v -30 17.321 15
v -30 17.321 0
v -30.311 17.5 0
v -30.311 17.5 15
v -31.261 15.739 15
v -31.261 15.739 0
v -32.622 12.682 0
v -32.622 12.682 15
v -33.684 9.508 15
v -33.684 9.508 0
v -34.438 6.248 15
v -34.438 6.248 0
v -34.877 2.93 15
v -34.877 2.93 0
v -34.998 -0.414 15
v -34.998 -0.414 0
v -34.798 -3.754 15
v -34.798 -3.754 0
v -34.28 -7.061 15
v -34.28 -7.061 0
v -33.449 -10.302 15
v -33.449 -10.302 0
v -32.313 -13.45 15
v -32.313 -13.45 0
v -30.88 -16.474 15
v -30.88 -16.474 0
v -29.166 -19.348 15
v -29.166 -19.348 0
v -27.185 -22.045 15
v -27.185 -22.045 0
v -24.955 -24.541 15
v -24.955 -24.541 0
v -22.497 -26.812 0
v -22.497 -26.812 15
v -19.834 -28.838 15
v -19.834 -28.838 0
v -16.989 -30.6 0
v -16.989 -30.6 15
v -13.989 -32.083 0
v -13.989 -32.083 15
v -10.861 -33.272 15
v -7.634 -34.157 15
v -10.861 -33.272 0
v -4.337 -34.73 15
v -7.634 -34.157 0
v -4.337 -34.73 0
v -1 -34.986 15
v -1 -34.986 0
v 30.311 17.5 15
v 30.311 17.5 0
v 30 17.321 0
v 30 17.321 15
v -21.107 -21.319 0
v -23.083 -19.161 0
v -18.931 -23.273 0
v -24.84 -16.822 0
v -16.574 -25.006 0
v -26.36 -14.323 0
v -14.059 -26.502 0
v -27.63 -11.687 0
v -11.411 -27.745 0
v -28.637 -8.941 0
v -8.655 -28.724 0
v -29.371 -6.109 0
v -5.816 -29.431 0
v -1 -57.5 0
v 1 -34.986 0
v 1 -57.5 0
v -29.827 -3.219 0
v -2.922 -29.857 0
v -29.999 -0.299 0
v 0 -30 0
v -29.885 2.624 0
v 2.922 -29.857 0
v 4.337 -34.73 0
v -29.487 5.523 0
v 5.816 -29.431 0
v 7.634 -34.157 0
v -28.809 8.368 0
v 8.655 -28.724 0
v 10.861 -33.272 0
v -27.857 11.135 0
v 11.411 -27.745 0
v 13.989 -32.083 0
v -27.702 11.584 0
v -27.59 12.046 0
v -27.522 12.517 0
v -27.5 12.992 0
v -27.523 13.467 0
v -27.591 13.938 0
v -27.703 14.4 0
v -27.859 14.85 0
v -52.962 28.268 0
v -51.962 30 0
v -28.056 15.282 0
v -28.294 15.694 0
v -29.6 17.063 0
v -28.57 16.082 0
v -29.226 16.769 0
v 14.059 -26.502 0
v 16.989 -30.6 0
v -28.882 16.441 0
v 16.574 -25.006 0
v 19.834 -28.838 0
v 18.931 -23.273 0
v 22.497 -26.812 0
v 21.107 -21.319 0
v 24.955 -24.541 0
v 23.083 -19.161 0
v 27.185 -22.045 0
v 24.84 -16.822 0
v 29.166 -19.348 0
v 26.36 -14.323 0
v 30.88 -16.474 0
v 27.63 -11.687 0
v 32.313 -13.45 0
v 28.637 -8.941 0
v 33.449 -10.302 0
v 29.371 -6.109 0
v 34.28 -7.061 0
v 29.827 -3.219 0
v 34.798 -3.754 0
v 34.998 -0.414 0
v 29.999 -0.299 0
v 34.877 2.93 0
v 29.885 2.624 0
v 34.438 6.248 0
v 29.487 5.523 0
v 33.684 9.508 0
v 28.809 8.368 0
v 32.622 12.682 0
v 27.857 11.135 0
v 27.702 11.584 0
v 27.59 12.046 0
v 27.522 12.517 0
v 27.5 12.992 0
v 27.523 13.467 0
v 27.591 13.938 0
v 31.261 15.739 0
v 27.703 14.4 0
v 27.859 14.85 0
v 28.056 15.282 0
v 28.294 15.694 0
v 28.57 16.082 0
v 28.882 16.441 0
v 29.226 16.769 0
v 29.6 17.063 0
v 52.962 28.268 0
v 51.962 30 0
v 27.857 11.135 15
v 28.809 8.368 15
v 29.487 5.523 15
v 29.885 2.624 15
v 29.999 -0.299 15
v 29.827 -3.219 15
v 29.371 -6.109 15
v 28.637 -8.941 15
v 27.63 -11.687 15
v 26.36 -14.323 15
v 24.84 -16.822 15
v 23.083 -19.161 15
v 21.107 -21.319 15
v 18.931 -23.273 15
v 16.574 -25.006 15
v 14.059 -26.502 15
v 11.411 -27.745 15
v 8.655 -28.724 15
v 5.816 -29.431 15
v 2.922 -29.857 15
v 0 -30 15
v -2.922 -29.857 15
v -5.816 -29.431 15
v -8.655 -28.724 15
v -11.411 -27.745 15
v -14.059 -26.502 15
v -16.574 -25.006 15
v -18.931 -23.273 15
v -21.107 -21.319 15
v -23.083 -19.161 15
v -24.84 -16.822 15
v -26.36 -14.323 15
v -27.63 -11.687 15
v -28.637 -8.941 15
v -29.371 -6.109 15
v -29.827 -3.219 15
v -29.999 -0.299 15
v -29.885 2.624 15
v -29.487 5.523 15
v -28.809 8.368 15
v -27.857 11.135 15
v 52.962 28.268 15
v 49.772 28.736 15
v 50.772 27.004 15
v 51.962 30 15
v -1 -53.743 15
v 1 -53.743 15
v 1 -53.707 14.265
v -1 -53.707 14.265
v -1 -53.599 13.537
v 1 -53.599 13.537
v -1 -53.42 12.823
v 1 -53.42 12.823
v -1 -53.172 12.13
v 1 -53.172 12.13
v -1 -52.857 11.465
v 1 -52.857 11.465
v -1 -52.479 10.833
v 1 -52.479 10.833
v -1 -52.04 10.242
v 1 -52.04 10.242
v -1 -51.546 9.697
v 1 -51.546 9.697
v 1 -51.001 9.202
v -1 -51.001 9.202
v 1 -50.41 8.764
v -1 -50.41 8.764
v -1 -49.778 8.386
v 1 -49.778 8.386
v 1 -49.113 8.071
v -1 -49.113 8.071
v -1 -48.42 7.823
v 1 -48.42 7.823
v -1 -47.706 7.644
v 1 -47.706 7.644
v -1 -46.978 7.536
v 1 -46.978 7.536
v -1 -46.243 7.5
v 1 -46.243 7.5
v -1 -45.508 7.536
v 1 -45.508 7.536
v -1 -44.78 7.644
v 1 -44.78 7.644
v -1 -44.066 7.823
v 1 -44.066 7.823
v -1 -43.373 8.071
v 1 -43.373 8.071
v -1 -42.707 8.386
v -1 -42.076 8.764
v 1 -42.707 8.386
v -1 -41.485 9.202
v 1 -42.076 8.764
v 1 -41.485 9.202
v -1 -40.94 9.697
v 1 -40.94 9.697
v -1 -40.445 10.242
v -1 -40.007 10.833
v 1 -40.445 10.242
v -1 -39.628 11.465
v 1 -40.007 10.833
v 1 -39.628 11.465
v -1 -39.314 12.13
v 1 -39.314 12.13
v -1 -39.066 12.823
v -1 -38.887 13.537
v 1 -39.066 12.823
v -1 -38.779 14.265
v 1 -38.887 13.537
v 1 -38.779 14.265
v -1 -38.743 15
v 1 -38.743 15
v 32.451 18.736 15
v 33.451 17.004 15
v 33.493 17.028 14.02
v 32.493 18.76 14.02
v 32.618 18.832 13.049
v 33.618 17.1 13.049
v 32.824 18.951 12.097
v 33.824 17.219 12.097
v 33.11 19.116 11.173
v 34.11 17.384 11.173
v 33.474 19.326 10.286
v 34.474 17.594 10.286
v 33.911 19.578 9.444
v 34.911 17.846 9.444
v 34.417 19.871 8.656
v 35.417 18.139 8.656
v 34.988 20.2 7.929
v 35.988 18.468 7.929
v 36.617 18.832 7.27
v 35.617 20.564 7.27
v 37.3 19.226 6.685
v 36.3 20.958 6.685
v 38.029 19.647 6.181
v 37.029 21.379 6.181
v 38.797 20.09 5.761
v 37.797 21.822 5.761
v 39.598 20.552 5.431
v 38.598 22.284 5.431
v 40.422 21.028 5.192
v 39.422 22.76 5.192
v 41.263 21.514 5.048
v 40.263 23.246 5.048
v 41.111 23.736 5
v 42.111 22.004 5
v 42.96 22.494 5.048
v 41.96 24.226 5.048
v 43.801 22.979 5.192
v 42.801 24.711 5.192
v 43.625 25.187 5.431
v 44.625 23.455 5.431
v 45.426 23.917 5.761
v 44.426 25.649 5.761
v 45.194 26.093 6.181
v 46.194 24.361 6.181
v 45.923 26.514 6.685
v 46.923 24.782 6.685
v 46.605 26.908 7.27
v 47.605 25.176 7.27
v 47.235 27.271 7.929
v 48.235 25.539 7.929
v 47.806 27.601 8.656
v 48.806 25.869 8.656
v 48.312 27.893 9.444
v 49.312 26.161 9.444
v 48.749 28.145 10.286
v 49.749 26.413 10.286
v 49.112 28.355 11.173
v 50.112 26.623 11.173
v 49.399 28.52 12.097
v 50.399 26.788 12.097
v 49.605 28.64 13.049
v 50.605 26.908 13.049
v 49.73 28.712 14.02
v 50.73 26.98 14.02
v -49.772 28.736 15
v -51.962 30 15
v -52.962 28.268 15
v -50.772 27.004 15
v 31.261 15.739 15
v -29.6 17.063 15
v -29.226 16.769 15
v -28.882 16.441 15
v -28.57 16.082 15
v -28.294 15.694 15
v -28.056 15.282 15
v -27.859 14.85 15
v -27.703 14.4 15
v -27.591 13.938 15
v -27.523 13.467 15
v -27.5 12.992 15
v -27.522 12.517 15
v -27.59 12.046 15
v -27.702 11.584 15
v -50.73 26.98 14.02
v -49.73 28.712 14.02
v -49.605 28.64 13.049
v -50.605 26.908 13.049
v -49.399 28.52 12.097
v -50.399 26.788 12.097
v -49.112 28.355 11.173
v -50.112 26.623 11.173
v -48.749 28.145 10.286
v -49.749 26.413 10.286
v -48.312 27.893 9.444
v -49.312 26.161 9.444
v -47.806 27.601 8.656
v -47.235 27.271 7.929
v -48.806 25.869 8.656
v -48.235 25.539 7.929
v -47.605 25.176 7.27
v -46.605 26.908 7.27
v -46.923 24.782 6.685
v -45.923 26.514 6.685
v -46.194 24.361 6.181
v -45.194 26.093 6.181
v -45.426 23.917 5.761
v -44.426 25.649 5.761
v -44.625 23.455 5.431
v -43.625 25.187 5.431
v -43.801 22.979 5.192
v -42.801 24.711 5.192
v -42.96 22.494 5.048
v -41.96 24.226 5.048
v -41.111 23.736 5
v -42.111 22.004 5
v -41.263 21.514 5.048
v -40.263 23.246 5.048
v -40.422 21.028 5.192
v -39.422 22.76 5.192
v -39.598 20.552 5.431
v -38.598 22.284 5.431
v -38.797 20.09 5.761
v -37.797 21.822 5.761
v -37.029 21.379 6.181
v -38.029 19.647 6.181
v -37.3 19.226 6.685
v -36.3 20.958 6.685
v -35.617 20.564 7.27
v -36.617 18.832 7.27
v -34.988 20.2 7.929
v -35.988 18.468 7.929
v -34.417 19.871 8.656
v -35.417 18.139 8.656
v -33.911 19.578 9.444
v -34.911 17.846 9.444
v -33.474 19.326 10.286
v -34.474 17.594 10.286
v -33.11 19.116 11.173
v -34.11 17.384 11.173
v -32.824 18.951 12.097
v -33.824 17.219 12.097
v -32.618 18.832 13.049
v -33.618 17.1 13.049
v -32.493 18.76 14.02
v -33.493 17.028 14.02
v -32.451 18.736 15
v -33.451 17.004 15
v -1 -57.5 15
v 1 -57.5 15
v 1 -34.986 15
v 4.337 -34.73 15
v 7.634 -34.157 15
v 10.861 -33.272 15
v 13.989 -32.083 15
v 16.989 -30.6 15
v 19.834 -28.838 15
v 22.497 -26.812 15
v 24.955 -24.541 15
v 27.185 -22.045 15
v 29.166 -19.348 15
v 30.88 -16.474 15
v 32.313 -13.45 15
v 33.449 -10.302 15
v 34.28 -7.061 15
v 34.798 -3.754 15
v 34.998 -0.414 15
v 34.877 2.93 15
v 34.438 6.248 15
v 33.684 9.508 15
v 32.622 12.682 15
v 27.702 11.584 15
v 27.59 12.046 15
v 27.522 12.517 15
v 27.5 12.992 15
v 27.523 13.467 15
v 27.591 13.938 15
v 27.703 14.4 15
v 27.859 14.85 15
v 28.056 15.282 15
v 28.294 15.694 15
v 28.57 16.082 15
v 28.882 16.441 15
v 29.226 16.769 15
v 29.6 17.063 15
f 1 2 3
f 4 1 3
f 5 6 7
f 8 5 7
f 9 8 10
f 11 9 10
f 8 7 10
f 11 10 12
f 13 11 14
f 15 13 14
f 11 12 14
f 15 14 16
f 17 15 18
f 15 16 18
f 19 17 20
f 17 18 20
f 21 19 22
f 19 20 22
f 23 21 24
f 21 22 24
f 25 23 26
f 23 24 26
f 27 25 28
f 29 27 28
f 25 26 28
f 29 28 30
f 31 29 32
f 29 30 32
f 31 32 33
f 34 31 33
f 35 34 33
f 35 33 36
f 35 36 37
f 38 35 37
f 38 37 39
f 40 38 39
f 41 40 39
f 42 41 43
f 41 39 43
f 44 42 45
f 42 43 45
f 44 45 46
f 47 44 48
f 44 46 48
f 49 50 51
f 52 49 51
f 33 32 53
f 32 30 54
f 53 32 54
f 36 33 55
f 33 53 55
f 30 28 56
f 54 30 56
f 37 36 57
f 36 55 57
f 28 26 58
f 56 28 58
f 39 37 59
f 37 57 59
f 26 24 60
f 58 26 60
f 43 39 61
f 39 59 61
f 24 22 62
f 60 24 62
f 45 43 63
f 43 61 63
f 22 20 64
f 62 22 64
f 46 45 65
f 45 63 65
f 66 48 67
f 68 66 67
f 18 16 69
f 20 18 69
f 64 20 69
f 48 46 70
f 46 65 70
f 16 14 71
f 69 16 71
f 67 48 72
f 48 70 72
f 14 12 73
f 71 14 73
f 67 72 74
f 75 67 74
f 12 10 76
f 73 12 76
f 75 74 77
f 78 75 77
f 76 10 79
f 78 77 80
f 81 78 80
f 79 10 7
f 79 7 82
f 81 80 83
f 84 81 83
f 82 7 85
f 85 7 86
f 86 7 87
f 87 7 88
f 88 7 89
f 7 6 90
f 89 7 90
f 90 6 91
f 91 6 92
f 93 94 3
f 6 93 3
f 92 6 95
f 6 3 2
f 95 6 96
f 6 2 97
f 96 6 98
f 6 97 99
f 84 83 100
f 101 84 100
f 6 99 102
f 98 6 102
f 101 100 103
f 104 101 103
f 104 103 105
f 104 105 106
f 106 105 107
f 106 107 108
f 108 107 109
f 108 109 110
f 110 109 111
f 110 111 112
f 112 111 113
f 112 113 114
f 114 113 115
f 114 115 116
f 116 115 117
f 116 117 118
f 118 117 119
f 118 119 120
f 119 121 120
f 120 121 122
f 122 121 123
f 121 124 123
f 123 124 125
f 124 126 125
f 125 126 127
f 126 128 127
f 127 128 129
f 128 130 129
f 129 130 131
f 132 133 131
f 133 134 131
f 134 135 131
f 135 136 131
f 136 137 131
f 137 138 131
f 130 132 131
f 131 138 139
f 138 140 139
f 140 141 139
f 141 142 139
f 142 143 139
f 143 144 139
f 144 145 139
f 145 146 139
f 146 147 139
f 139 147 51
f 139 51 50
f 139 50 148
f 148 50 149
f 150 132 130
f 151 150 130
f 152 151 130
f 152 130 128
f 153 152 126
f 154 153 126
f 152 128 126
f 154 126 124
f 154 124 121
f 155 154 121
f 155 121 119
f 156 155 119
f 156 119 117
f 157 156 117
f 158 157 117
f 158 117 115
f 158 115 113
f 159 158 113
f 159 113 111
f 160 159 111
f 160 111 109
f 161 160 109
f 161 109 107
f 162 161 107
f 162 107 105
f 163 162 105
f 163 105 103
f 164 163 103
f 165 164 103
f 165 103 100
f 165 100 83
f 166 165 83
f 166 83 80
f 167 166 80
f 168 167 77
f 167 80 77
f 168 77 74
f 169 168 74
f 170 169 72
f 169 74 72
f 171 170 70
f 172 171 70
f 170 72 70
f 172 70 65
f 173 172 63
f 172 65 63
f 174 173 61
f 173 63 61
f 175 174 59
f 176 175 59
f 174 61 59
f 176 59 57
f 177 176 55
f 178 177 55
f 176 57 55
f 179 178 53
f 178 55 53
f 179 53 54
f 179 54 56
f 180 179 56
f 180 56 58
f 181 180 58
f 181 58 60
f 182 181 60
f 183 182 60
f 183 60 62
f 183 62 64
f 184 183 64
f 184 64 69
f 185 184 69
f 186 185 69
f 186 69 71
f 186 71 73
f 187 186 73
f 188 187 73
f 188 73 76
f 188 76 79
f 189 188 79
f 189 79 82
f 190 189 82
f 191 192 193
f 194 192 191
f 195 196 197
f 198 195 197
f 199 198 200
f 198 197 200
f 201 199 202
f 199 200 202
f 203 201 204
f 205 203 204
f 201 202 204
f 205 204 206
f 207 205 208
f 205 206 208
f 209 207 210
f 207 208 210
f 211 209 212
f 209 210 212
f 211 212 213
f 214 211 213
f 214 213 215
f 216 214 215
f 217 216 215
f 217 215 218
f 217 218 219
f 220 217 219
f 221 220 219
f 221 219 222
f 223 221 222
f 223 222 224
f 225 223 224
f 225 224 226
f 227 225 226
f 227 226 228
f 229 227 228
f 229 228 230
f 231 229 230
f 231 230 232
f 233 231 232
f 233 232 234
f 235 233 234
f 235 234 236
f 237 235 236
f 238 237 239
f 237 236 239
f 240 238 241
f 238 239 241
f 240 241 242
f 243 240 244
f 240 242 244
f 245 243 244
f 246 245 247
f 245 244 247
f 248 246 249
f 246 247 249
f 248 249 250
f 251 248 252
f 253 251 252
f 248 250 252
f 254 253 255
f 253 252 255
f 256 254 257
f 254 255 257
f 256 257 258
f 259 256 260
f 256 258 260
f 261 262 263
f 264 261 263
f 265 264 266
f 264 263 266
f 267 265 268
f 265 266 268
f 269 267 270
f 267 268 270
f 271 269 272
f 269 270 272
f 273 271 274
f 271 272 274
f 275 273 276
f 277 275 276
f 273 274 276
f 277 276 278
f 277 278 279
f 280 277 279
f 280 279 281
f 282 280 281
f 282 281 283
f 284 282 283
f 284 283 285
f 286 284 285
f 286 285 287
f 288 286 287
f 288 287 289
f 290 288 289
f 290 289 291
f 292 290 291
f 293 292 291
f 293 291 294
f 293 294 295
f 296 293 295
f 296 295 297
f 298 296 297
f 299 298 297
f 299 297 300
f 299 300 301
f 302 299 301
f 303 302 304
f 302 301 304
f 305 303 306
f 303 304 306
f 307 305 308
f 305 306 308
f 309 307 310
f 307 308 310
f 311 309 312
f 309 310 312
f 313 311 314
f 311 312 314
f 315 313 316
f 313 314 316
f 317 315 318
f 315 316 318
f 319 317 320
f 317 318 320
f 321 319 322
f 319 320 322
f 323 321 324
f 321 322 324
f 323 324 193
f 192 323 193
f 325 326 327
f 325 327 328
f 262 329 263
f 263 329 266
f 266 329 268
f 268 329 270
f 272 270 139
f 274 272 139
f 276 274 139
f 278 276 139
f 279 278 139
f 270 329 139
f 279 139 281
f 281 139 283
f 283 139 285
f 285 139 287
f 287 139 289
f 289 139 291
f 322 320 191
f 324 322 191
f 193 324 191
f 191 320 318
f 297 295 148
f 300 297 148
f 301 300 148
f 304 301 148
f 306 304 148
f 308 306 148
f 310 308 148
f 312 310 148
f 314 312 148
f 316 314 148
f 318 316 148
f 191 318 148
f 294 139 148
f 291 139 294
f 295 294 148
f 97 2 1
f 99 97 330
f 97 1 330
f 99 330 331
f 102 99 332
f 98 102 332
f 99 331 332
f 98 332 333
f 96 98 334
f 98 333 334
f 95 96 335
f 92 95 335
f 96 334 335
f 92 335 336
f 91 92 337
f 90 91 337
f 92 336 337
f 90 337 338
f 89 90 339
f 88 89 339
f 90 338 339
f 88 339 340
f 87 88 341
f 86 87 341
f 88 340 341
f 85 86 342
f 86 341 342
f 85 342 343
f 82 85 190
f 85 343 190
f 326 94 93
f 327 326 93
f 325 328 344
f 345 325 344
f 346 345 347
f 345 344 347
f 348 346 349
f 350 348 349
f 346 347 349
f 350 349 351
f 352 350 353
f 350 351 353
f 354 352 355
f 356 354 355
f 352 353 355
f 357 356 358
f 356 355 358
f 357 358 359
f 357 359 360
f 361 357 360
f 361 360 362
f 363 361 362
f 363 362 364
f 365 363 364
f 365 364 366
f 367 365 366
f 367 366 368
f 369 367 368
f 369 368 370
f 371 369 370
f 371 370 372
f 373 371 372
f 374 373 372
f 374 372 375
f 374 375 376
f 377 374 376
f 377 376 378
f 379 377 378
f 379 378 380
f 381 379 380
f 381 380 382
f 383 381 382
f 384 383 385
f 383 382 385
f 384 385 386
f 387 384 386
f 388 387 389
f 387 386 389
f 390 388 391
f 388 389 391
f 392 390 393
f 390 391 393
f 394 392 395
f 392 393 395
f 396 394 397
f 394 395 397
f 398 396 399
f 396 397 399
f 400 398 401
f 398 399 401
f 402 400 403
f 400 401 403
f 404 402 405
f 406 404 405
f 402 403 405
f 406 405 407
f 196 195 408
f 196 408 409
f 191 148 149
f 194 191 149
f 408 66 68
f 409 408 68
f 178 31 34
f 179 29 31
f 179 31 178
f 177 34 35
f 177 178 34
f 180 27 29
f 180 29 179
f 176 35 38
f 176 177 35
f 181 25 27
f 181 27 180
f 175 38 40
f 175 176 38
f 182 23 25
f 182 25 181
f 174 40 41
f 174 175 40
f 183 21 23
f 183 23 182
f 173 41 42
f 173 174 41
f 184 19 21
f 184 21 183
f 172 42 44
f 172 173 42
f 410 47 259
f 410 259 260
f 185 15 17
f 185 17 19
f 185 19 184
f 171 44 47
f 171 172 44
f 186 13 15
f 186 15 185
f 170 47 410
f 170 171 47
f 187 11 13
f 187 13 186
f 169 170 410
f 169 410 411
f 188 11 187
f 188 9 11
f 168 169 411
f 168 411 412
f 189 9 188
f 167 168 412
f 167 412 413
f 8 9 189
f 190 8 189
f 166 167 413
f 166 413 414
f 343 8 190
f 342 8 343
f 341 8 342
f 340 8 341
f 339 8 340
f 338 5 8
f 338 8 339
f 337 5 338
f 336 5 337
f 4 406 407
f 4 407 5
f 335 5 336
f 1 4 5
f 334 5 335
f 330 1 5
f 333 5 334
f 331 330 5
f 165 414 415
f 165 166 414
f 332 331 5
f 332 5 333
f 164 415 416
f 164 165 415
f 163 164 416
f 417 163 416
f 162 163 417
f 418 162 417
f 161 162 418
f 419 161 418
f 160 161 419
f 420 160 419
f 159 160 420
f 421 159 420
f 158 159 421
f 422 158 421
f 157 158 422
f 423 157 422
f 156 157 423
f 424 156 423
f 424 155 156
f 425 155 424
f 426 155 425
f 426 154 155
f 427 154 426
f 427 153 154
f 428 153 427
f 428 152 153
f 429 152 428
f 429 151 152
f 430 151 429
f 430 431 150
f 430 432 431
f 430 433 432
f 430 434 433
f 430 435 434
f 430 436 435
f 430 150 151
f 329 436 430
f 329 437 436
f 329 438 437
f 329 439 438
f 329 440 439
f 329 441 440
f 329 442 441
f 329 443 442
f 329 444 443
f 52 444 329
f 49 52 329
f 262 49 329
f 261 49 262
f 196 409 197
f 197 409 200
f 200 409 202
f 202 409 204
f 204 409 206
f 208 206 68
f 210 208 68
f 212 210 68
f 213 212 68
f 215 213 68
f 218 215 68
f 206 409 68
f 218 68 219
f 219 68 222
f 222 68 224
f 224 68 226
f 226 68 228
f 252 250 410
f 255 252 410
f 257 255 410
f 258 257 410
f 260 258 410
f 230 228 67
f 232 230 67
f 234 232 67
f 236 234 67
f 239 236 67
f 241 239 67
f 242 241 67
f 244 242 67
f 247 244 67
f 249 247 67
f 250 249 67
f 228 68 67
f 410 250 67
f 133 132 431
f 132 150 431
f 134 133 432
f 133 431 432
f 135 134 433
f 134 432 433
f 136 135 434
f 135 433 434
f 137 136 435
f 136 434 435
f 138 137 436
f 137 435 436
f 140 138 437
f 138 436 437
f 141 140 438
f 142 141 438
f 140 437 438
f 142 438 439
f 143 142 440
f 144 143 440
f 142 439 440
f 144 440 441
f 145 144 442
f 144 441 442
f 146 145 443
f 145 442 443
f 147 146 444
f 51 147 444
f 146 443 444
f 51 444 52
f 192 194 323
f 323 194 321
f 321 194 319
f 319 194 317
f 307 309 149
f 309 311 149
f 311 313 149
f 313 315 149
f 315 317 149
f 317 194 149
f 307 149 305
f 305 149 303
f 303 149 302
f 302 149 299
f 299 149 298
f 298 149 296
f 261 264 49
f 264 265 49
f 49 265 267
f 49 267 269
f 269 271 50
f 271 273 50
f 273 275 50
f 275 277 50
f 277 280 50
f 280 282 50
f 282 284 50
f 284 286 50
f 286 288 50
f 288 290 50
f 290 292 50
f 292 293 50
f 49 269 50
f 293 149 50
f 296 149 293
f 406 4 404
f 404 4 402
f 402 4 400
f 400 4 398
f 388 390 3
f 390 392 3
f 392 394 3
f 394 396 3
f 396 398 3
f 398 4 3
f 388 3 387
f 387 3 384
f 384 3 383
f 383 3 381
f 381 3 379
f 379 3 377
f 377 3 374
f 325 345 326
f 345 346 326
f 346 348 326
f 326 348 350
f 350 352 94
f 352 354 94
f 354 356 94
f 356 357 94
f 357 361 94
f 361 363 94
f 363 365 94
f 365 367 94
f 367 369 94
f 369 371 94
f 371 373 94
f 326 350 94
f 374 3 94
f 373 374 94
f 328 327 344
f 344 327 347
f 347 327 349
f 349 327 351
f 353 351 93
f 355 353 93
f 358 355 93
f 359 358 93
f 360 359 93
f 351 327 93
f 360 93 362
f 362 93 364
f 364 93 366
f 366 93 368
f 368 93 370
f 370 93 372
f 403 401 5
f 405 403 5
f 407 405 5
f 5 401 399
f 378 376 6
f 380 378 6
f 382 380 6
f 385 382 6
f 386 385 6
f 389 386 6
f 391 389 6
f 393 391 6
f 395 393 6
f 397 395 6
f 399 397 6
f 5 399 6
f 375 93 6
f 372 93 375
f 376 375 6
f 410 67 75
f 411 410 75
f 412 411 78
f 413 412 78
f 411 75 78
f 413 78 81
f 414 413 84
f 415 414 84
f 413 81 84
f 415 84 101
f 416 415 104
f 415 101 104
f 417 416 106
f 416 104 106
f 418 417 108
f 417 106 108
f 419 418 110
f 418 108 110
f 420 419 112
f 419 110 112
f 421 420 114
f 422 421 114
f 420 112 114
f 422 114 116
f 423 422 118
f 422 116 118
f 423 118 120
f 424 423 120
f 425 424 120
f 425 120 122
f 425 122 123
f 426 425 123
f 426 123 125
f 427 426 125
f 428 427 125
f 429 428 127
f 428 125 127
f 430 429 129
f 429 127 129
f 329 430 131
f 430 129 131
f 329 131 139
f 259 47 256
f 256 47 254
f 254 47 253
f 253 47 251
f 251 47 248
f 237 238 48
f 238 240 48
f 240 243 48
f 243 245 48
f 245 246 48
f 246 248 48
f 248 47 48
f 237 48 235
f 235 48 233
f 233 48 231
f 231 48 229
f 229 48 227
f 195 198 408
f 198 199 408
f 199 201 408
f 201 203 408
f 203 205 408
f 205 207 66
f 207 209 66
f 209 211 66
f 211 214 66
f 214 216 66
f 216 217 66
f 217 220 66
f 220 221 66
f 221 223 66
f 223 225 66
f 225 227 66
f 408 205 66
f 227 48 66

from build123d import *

# Parameters (mm, degrees)
F1_DEPTH = 15
F3_DEPTH = 54.4625242271
F5_DEPTH = 54.4625242271
F7_DEPTH = 53.9625242271
F8_R     = 5


with BuildPart() as f1:
    # F0 (on Top) → F1 (new body)
    with BuildSketch(Plane.XY):
        with BuildLine():
            Line((-25.9807621135, 15), (-30.3108891325, 17.5))
            ThreePointArc((-30.3108891325, 17.5), (-30.7987090687, 16.6264704522), (-31.2613615027, 15.7393544021))
            ThreePointArc((-31.2613615027, 15.7393544021), (-30.057560378, -17.9316219045), (-1, -34.9857113691))
            Line((-1, -34.9857113691), (-1, -32.5))
            Line((-1, -32.5), (1, -32.5))
            Line((1, -32.5), (1, -34.9857113691))
            ThreePointArc((1, -34.9857113691), (30.057560378, -17.9316219045), (31.2613615027, 15.7393544021))
            ThreePointArc((31.2613615027, 15.7393544021), (30.7987090687, 16.6264704522), (30.3108891325, 17.5))
            Line((30.3108891325, 17.5), (25.9807621135, 15))
            ThreePointArc((25.9807621135, 15), (0, -30), (-25.9807621135, 15))
        make_face()
        with BuildLine():
            ThreePointArc((-31.2613615027, 15.7393544021), (-30.7987090687, 16.6264704522), (-30.3108891325, 17.5))
            Line((-30.3108891325, 17.5), (-51.9615242271, 30))
            Line((-51.9615242271, 30), (-52.9615242271, 28.2679491924))
            Line((-52.9615242271, 28.2679491924), (-31.2613615027, 15.7393544021))
        make_face()
        with BuildLine():
            Line((-1, -32.5), (-1, -34.9857113691))
            ThreePointArc((-1, -34.9857113691), (0, -35), (1, -34.9857113691))
            Line((1, -34.9857113691), (1, -32.5))
            Line((1, -32.5), (-1, -32.5))
        make_face()
        with BuildLine():
            ThreePointArc((1, -34.9857113691), (0, -35), (-1, -34.9857113691))
            Line((-1, -34.9857113691), (-1, -57.5))
            Line((-1, -57.5), (1, -57.5))
            Line((1, -57.5), (1, -34.9857113691))
        make_face()
        with BuildLine():
            Line((51.9615242271, 30), (30.3108891325, 17.5))
            ThreePointArc((30.3108891325, 17.5), (30.7987090687, 16.6264704522), (31.2613615027, 15.7393544021))
            Line((31.2613615027, 15.7393544021), (52.9615242271, 28.2679491924))
            Line((52.9615242271, 28.2679491924), (51.9615242271, 30))
        make_face()
    extrude(amount=F1_DEPTH)

    # F2 (on face) → F3 (cut, through all)
    with BuildSketch(Plane(origin=(-1, -1.7320508076, 0), x_dir=(0.8660254038, -0.5, 0), z_dir=(-0.5, -0.8660254038, 0))):
        with BuildLine():
            Line((-37.4714052097, 15), (-57.4714052097, 15))
            ThreePointArc((-57.4714052097, 15), (-47.4714052097, 5), (-37.4714052097, 15))
        make_face()
    extrude(amount=-F3_DEPTH, mode=Mode.SUBTRACT)

    # F4 (on face) → F5 (cut, through all)
    with BuildSketch(Plane(origin=(1, -1.7320508076, 0), x_dir=(0.8660254038, 0.5, 0), z_dir=(0.5, -0.8660254038, 0))):
        with BuildLine():
            Line((57.4714052097, 15), (37.4714052097, 15))
            ThreePointArc((37.4714052097, 15), (47.4714052097, 5), (57.4714052097, 15))
        make_face()
    extrude(amount=-F5_DEPTH, mode=Mode.SUBTRACT)

    # F6 (on face) → F7 (cut, through all)
    with BuildSketch(Plane.YZ.offset(1)):
        with BuildLine():
            Line((-38.7428556845, 15), (-53.7428556845, 15))
            ThreePointArc((-53.7428556845, 15), (-46.2428556845, 7.5), (-38.7428556845, 15))
        make_face()
    extrude(amount=-F7_DEPTH, mode=Mode.SUBTRACT)

    # F8
    f8_edges = [f1.edges().sort_by_distance(p)[0] for p in [
        (-25.980762, 15, 7.5),
        (25.980762, 15, 7.5),
    ]]
    fillet(f8_edges, radius=F8_R)


solid = f1.part
